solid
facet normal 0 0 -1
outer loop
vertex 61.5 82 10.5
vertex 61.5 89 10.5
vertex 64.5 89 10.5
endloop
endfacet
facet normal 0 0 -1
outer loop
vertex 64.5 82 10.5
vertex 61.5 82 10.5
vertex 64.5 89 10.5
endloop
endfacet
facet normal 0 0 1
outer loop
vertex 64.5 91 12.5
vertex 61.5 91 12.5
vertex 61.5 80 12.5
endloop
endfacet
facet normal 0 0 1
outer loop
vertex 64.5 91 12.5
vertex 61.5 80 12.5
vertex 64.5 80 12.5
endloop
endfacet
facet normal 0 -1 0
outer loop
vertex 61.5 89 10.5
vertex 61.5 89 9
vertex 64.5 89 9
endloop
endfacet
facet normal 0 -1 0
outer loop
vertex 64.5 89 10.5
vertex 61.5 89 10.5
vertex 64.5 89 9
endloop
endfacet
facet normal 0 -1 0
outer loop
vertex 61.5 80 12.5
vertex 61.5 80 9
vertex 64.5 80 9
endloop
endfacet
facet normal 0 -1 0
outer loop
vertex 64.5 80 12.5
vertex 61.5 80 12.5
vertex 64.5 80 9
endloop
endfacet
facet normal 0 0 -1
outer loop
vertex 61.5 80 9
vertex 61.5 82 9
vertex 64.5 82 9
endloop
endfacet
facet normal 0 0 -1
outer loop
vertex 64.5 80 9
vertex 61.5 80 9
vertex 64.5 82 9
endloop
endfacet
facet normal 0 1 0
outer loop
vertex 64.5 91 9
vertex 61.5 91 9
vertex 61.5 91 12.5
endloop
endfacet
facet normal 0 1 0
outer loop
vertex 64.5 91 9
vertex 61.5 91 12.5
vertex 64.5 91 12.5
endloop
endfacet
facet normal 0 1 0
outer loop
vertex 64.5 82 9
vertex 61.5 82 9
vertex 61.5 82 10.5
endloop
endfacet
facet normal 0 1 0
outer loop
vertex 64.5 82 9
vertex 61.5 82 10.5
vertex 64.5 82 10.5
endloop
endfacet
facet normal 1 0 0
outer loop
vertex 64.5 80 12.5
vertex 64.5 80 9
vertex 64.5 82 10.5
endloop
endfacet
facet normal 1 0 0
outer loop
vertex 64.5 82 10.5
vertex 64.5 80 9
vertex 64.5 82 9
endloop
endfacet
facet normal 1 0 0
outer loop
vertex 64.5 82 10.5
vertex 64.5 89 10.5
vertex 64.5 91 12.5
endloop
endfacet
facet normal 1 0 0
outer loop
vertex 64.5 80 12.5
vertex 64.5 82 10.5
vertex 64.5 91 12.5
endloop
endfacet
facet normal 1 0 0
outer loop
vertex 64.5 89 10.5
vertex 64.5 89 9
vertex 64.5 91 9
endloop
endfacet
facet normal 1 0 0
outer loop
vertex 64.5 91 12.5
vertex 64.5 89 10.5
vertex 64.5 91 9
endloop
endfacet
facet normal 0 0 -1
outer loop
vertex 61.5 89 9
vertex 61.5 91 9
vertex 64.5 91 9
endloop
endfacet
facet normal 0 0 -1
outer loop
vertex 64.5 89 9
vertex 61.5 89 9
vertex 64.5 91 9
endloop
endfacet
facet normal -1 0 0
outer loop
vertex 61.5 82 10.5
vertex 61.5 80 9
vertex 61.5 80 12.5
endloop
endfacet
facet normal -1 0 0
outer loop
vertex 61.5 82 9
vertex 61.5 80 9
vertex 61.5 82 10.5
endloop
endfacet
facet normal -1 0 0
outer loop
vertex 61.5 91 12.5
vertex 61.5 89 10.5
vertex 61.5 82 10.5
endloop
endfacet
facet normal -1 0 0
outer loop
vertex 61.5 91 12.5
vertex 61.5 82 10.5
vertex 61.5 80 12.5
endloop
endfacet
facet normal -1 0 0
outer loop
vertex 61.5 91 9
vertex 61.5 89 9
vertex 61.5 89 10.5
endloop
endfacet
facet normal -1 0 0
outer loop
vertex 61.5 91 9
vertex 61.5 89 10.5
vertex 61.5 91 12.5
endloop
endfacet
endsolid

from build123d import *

# Parameters (mm, degrees)
BOX028_W     = 3
BOX028_H     = 7
BOX028_DEPTH = 2
BOX029_W     = 3
BOX029_H     = 2
BOX029_DEPTH = 3.5
BOX030_W     = 3
BOX030_H     = 2
BOX030_DEPTH = 3.5


with BuildPart() as ziptie004:
    # Box028 → Box028 (new body)
    with BuildSketch(Plane(origin=(17.5, 39, 10), x_dir=(1, 0, 0), z_dir=(0, 0, 1))):
        with Locations((1.5, 3.5)):
            Rectangle(BOX028_W, BOX028_H)
    extrude(amount=BOX028_DEPTH)


with BuildPart() as ziptie005:
    # Box029 → Box029 (new body)
    with BuildSketch(Plane(origin=(17.5, 46, 8.5), x_dir=(1, 0, 0), z_dir=(0, 0, 1))):
        with Locations((1.5, 1)):
            Rectangle(BOX029_W, BOX029_H)
    extrude(amount=BOX029_DEPTH)


with BuildPart() as main_power_ziptie_ring:
    # Box030 → Box030 (new body)
    with BuildSketch(Plane(origin=(17.5, 37, 8.5), x_dir=(1, 0, 0), z_dir=(0, 0, 1))):
        with Locations((1.5, 1)):
            Rectangle(BOX030_W, BOX030_H)
    extrude(amount=BOX030_DEPTH)

    # Fusion028: union Ziptie004, Ziptie005
    add(ziptie004.part)
    add(ziptie005.part)


with BuildPart() as main_power_ziptie_ring_1:
    # Fusion028 placement: moved
    add(main_power_ziptie_ring.part.moved(Location((44, 43, 0.5))))


solid = main_power_ziptie_ring_1.part
